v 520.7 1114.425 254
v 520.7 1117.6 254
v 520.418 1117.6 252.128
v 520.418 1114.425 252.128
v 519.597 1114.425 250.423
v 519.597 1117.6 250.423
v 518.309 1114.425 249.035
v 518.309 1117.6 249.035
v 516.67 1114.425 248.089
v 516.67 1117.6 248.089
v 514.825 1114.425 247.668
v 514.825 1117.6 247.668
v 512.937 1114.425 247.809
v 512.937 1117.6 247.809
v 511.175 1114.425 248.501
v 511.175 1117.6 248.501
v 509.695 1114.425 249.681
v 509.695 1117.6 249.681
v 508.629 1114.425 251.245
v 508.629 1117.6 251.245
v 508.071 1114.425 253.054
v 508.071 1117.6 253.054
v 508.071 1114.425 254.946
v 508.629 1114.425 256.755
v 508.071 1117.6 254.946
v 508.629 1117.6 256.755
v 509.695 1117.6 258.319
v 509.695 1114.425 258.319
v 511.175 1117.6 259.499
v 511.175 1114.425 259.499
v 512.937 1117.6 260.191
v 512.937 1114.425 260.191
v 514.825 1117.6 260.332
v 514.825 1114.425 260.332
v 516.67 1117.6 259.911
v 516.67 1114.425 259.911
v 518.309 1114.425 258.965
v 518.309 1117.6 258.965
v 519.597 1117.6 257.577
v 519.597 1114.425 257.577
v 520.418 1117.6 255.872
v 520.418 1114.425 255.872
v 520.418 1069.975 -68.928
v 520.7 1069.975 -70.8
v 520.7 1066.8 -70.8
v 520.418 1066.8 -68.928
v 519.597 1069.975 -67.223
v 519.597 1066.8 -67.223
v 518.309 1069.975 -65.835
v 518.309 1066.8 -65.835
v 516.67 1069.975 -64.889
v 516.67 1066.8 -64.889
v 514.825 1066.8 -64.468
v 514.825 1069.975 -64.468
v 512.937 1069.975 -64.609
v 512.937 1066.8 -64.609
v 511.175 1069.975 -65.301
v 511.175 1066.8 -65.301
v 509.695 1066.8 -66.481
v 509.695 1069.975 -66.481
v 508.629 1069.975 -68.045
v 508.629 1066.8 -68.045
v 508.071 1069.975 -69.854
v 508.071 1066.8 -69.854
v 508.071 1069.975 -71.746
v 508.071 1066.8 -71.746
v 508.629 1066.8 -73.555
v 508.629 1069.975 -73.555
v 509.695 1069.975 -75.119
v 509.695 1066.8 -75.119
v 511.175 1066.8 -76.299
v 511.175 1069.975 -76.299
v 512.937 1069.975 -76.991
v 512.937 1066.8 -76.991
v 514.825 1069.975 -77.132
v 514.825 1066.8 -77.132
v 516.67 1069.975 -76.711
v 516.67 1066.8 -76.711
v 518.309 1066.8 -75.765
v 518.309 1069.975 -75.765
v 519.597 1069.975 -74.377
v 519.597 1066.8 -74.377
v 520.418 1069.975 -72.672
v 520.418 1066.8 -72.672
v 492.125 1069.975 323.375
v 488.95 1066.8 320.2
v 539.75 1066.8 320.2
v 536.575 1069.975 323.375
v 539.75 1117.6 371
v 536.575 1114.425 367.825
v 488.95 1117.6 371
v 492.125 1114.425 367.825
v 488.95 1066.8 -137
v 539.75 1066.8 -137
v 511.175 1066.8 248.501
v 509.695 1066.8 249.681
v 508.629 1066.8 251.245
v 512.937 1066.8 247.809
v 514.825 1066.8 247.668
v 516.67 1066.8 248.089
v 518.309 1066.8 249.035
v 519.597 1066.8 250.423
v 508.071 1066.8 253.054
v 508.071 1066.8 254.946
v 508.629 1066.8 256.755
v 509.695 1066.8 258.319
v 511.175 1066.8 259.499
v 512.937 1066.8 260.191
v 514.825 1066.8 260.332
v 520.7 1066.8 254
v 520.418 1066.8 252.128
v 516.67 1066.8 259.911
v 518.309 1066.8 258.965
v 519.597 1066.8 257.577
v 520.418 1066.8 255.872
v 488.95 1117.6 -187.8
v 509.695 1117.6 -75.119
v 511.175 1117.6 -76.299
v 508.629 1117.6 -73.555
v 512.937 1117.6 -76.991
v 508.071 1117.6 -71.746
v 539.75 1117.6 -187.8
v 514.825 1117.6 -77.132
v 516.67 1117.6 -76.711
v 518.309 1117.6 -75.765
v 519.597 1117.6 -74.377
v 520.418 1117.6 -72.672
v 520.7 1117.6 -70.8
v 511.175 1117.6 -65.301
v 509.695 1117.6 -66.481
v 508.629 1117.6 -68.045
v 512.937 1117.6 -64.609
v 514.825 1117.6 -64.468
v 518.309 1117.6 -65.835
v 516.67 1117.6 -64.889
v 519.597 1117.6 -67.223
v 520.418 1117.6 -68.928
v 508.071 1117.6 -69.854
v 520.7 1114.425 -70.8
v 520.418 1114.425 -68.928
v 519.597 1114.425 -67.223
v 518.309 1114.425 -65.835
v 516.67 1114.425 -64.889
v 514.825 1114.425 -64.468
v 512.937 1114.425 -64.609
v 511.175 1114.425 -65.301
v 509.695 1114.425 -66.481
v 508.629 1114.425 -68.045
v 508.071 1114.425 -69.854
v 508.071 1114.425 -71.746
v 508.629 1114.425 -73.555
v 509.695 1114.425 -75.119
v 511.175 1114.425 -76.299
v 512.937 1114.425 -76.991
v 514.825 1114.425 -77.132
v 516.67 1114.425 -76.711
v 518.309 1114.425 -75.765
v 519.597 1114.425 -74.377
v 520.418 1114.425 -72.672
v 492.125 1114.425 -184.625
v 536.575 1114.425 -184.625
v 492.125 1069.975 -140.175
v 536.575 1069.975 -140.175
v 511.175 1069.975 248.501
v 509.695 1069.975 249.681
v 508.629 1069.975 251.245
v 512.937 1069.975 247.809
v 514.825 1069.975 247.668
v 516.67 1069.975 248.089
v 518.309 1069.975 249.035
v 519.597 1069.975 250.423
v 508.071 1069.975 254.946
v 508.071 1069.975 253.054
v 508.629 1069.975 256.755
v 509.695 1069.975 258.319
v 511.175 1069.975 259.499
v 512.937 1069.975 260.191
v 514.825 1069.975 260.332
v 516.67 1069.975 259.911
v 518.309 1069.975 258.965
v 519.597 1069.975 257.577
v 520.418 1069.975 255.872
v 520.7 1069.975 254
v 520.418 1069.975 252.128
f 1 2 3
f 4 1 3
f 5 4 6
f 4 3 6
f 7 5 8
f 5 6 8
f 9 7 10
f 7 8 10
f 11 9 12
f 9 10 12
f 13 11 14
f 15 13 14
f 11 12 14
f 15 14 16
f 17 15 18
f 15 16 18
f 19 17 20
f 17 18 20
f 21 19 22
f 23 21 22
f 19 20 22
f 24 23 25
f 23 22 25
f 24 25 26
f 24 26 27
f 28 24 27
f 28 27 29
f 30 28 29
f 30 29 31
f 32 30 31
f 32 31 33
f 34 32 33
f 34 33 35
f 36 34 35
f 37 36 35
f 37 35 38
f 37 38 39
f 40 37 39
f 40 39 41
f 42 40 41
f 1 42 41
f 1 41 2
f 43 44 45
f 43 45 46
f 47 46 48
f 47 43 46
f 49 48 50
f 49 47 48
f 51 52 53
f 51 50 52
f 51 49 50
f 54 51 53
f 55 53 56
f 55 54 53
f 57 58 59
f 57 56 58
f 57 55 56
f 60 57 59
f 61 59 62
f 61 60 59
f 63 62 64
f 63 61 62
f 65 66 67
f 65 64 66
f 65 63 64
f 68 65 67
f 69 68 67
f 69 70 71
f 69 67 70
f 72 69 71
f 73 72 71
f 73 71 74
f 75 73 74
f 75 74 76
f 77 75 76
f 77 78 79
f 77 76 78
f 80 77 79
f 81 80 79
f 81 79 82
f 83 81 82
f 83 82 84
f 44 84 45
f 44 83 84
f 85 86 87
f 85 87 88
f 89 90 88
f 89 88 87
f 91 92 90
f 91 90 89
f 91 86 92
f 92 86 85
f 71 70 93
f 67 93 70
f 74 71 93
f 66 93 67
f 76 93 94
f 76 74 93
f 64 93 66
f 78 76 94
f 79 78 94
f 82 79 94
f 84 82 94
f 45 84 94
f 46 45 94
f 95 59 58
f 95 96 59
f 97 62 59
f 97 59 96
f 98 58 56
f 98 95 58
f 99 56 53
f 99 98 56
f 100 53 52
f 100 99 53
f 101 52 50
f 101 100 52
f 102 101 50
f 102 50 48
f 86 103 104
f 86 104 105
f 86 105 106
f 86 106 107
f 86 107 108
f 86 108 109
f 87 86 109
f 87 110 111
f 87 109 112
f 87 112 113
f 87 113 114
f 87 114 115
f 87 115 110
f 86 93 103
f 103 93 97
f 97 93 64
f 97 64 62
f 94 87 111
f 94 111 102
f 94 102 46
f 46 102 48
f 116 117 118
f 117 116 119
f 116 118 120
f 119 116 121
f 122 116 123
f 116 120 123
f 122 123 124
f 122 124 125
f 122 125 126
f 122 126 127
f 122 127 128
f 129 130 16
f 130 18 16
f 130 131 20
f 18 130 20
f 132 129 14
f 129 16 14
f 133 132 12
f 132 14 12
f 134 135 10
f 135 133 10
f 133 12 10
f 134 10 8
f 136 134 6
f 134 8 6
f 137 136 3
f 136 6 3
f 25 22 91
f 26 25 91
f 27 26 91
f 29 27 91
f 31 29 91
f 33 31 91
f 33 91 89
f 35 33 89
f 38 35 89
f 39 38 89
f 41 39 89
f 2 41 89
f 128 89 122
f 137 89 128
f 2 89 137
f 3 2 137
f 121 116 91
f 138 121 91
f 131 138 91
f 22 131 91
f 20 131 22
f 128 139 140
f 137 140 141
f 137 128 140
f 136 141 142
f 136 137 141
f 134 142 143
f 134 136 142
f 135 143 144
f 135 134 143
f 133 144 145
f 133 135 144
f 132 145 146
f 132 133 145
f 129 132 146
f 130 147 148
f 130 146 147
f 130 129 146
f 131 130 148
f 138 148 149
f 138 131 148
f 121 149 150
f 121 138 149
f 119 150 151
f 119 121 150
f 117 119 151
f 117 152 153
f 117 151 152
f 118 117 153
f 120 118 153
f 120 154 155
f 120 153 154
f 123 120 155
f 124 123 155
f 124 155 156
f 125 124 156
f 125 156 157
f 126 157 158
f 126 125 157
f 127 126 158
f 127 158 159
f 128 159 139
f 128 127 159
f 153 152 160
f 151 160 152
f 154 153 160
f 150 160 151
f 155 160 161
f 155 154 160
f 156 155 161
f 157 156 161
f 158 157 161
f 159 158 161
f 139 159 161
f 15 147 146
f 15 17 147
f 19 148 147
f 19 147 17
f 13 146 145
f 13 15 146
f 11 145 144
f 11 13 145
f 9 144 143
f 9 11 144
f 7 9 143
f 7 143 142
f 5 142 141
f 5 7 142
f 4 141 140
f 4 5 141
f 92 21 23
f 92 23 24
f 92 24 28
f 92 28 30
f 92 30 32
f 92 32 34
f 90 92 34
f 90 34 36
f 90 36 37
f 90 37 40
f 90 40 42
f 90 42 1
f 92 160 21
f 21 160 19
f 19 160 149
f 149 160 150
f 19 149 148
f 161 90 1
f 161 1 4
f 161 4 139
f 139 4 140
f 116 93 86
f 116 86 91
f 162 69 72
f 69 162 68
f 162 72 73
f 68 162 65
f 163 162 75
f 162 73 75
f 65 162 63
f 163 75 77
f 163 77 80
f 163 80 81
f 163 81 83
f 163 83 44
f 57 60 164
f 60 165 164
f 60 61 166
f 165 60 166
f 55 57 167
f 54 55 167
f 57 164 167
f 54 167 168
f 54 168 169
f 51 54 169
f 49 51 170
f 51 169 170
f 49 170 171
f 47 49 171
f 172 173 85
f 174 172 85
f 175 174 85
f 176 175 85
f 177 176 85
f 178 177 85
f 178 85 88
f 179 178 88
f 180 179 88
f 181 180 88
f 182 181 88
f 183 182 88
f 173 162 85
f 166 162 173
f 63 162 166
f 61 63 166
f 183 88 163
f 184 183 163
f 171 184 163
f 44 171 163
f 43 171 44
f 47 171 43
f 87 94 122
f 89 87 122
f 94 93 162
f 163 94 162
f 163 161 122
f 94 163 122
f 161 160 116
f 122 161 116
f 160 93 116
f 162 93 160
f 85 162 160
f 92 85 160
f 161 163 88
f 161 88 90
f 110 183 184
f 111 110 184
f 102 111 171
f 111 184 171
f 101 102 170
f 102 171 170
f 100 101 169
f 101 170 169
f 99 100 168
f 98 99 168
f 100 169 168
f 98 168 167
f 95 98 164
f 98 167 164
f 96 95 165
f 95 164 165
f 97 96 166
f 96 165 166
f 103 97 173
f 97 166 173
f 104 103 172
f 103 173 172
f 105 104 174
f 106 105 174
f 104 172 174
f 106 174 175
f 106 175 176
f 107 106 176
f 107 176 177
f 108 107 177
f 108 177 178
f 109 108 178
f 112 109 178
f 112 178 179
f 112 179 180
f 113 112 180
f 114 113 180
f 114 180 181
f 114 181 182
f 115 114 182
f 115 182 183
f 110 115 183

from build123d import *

# Parameters (mm, degrees)
SKETCH1_W           = 50.8
SKETCH1_H           = 50.8
SKETCH1_W_2         = 44.45
SKETCH1_H_2         = 44.45
EXTRUDE_THIN1_DEPTH = 279.4
CUT_EXTRUDE1_START  = -51.8
CUT_EXTRUDE1_DEPTH  = 52.8
SKETCH3_R           = 6.35
CUT_EXTRUDE2_DEPTH  = 51.8


with BuildPart() as part:
    # Sketch1 → Extrude-Thin1 (new body)
    with BuildSketch(Plane.XY.offset(91.6)):
        with Locations((514.35, 1092.2)):
            Rectangle(SKETCH1_W, SKETCH1_H)
        with Locations((514.35, 1092.2)):
            Rectangle(SKETCH1_W_2, SKETCH1_H_2, mode=Mode.SUBTRACT)
    extrude_thin1 = extrude(amount=EXTRUDE_THIN1_DEPTH)

    # Sketch2 → Cut-Extrude1 (cut)
    with BuildSketch(Plane(origin=(539.75, 0, 0), x_dir=(0, 0, -1), z_dir=(1, 0, 0)).offset(CUT_EXTRUDE1_START)):
        Polygon((-779.680330653, 1526.280330653), (-371, 1117.6), (-320.2, 1066.8), (88.480330653, 658.119669347), (-728.880330653, -159.24099196), (-1597.04099196, 708.919669347), align=None)
    cut_extrude1 = extrude(amount=CUT_EXTRUDE1_DEPTH, mode=Mode.SUBTRACT)

    # Sketch3 → Cut-Extrude2 (cut, through all)
    with BuildSketch(Plane(origin=(0, 1117.6, 0), x_dir=(1, 0, 0), z_dir=(0, 1, 0))):
        with Locations((514.35, -254)):
            Circle(SKETCH3_R)
        with Locations((507.848069556, 254)):
            Circle(SKETCH3_R)
    cut_extrude2 = extrude(amount=-CUT_EXTRUDE2_DEPTH, mode=Mode.SUBTRACT)

    # Mirror1: Extrude-Thin1, Cut-Extrude1, Cut-Extrude2 across plane
    add(extrude_thin1.mirror(Plane(origin=(488.95, 1066.8, 91.6), x_dir=(1, 0, 0), z_dir=(0, 0, 1))))
    add(cut_extrude1.mirror(Plane(origin=(488.95, 1066.8, 91.6), x_dir=(1, 0, 0), z_dir=(0, 0, 1))), mode=Mode.SUBTRACT)
    add(cut_extrude2.mirror(Plane(origin=(488.95, 1066.8, 91.6), x_dir=(1, 0, 0), z_dir=(0, 0, 1))), mode=Mode.SUBTRACT)


solid = part.part
